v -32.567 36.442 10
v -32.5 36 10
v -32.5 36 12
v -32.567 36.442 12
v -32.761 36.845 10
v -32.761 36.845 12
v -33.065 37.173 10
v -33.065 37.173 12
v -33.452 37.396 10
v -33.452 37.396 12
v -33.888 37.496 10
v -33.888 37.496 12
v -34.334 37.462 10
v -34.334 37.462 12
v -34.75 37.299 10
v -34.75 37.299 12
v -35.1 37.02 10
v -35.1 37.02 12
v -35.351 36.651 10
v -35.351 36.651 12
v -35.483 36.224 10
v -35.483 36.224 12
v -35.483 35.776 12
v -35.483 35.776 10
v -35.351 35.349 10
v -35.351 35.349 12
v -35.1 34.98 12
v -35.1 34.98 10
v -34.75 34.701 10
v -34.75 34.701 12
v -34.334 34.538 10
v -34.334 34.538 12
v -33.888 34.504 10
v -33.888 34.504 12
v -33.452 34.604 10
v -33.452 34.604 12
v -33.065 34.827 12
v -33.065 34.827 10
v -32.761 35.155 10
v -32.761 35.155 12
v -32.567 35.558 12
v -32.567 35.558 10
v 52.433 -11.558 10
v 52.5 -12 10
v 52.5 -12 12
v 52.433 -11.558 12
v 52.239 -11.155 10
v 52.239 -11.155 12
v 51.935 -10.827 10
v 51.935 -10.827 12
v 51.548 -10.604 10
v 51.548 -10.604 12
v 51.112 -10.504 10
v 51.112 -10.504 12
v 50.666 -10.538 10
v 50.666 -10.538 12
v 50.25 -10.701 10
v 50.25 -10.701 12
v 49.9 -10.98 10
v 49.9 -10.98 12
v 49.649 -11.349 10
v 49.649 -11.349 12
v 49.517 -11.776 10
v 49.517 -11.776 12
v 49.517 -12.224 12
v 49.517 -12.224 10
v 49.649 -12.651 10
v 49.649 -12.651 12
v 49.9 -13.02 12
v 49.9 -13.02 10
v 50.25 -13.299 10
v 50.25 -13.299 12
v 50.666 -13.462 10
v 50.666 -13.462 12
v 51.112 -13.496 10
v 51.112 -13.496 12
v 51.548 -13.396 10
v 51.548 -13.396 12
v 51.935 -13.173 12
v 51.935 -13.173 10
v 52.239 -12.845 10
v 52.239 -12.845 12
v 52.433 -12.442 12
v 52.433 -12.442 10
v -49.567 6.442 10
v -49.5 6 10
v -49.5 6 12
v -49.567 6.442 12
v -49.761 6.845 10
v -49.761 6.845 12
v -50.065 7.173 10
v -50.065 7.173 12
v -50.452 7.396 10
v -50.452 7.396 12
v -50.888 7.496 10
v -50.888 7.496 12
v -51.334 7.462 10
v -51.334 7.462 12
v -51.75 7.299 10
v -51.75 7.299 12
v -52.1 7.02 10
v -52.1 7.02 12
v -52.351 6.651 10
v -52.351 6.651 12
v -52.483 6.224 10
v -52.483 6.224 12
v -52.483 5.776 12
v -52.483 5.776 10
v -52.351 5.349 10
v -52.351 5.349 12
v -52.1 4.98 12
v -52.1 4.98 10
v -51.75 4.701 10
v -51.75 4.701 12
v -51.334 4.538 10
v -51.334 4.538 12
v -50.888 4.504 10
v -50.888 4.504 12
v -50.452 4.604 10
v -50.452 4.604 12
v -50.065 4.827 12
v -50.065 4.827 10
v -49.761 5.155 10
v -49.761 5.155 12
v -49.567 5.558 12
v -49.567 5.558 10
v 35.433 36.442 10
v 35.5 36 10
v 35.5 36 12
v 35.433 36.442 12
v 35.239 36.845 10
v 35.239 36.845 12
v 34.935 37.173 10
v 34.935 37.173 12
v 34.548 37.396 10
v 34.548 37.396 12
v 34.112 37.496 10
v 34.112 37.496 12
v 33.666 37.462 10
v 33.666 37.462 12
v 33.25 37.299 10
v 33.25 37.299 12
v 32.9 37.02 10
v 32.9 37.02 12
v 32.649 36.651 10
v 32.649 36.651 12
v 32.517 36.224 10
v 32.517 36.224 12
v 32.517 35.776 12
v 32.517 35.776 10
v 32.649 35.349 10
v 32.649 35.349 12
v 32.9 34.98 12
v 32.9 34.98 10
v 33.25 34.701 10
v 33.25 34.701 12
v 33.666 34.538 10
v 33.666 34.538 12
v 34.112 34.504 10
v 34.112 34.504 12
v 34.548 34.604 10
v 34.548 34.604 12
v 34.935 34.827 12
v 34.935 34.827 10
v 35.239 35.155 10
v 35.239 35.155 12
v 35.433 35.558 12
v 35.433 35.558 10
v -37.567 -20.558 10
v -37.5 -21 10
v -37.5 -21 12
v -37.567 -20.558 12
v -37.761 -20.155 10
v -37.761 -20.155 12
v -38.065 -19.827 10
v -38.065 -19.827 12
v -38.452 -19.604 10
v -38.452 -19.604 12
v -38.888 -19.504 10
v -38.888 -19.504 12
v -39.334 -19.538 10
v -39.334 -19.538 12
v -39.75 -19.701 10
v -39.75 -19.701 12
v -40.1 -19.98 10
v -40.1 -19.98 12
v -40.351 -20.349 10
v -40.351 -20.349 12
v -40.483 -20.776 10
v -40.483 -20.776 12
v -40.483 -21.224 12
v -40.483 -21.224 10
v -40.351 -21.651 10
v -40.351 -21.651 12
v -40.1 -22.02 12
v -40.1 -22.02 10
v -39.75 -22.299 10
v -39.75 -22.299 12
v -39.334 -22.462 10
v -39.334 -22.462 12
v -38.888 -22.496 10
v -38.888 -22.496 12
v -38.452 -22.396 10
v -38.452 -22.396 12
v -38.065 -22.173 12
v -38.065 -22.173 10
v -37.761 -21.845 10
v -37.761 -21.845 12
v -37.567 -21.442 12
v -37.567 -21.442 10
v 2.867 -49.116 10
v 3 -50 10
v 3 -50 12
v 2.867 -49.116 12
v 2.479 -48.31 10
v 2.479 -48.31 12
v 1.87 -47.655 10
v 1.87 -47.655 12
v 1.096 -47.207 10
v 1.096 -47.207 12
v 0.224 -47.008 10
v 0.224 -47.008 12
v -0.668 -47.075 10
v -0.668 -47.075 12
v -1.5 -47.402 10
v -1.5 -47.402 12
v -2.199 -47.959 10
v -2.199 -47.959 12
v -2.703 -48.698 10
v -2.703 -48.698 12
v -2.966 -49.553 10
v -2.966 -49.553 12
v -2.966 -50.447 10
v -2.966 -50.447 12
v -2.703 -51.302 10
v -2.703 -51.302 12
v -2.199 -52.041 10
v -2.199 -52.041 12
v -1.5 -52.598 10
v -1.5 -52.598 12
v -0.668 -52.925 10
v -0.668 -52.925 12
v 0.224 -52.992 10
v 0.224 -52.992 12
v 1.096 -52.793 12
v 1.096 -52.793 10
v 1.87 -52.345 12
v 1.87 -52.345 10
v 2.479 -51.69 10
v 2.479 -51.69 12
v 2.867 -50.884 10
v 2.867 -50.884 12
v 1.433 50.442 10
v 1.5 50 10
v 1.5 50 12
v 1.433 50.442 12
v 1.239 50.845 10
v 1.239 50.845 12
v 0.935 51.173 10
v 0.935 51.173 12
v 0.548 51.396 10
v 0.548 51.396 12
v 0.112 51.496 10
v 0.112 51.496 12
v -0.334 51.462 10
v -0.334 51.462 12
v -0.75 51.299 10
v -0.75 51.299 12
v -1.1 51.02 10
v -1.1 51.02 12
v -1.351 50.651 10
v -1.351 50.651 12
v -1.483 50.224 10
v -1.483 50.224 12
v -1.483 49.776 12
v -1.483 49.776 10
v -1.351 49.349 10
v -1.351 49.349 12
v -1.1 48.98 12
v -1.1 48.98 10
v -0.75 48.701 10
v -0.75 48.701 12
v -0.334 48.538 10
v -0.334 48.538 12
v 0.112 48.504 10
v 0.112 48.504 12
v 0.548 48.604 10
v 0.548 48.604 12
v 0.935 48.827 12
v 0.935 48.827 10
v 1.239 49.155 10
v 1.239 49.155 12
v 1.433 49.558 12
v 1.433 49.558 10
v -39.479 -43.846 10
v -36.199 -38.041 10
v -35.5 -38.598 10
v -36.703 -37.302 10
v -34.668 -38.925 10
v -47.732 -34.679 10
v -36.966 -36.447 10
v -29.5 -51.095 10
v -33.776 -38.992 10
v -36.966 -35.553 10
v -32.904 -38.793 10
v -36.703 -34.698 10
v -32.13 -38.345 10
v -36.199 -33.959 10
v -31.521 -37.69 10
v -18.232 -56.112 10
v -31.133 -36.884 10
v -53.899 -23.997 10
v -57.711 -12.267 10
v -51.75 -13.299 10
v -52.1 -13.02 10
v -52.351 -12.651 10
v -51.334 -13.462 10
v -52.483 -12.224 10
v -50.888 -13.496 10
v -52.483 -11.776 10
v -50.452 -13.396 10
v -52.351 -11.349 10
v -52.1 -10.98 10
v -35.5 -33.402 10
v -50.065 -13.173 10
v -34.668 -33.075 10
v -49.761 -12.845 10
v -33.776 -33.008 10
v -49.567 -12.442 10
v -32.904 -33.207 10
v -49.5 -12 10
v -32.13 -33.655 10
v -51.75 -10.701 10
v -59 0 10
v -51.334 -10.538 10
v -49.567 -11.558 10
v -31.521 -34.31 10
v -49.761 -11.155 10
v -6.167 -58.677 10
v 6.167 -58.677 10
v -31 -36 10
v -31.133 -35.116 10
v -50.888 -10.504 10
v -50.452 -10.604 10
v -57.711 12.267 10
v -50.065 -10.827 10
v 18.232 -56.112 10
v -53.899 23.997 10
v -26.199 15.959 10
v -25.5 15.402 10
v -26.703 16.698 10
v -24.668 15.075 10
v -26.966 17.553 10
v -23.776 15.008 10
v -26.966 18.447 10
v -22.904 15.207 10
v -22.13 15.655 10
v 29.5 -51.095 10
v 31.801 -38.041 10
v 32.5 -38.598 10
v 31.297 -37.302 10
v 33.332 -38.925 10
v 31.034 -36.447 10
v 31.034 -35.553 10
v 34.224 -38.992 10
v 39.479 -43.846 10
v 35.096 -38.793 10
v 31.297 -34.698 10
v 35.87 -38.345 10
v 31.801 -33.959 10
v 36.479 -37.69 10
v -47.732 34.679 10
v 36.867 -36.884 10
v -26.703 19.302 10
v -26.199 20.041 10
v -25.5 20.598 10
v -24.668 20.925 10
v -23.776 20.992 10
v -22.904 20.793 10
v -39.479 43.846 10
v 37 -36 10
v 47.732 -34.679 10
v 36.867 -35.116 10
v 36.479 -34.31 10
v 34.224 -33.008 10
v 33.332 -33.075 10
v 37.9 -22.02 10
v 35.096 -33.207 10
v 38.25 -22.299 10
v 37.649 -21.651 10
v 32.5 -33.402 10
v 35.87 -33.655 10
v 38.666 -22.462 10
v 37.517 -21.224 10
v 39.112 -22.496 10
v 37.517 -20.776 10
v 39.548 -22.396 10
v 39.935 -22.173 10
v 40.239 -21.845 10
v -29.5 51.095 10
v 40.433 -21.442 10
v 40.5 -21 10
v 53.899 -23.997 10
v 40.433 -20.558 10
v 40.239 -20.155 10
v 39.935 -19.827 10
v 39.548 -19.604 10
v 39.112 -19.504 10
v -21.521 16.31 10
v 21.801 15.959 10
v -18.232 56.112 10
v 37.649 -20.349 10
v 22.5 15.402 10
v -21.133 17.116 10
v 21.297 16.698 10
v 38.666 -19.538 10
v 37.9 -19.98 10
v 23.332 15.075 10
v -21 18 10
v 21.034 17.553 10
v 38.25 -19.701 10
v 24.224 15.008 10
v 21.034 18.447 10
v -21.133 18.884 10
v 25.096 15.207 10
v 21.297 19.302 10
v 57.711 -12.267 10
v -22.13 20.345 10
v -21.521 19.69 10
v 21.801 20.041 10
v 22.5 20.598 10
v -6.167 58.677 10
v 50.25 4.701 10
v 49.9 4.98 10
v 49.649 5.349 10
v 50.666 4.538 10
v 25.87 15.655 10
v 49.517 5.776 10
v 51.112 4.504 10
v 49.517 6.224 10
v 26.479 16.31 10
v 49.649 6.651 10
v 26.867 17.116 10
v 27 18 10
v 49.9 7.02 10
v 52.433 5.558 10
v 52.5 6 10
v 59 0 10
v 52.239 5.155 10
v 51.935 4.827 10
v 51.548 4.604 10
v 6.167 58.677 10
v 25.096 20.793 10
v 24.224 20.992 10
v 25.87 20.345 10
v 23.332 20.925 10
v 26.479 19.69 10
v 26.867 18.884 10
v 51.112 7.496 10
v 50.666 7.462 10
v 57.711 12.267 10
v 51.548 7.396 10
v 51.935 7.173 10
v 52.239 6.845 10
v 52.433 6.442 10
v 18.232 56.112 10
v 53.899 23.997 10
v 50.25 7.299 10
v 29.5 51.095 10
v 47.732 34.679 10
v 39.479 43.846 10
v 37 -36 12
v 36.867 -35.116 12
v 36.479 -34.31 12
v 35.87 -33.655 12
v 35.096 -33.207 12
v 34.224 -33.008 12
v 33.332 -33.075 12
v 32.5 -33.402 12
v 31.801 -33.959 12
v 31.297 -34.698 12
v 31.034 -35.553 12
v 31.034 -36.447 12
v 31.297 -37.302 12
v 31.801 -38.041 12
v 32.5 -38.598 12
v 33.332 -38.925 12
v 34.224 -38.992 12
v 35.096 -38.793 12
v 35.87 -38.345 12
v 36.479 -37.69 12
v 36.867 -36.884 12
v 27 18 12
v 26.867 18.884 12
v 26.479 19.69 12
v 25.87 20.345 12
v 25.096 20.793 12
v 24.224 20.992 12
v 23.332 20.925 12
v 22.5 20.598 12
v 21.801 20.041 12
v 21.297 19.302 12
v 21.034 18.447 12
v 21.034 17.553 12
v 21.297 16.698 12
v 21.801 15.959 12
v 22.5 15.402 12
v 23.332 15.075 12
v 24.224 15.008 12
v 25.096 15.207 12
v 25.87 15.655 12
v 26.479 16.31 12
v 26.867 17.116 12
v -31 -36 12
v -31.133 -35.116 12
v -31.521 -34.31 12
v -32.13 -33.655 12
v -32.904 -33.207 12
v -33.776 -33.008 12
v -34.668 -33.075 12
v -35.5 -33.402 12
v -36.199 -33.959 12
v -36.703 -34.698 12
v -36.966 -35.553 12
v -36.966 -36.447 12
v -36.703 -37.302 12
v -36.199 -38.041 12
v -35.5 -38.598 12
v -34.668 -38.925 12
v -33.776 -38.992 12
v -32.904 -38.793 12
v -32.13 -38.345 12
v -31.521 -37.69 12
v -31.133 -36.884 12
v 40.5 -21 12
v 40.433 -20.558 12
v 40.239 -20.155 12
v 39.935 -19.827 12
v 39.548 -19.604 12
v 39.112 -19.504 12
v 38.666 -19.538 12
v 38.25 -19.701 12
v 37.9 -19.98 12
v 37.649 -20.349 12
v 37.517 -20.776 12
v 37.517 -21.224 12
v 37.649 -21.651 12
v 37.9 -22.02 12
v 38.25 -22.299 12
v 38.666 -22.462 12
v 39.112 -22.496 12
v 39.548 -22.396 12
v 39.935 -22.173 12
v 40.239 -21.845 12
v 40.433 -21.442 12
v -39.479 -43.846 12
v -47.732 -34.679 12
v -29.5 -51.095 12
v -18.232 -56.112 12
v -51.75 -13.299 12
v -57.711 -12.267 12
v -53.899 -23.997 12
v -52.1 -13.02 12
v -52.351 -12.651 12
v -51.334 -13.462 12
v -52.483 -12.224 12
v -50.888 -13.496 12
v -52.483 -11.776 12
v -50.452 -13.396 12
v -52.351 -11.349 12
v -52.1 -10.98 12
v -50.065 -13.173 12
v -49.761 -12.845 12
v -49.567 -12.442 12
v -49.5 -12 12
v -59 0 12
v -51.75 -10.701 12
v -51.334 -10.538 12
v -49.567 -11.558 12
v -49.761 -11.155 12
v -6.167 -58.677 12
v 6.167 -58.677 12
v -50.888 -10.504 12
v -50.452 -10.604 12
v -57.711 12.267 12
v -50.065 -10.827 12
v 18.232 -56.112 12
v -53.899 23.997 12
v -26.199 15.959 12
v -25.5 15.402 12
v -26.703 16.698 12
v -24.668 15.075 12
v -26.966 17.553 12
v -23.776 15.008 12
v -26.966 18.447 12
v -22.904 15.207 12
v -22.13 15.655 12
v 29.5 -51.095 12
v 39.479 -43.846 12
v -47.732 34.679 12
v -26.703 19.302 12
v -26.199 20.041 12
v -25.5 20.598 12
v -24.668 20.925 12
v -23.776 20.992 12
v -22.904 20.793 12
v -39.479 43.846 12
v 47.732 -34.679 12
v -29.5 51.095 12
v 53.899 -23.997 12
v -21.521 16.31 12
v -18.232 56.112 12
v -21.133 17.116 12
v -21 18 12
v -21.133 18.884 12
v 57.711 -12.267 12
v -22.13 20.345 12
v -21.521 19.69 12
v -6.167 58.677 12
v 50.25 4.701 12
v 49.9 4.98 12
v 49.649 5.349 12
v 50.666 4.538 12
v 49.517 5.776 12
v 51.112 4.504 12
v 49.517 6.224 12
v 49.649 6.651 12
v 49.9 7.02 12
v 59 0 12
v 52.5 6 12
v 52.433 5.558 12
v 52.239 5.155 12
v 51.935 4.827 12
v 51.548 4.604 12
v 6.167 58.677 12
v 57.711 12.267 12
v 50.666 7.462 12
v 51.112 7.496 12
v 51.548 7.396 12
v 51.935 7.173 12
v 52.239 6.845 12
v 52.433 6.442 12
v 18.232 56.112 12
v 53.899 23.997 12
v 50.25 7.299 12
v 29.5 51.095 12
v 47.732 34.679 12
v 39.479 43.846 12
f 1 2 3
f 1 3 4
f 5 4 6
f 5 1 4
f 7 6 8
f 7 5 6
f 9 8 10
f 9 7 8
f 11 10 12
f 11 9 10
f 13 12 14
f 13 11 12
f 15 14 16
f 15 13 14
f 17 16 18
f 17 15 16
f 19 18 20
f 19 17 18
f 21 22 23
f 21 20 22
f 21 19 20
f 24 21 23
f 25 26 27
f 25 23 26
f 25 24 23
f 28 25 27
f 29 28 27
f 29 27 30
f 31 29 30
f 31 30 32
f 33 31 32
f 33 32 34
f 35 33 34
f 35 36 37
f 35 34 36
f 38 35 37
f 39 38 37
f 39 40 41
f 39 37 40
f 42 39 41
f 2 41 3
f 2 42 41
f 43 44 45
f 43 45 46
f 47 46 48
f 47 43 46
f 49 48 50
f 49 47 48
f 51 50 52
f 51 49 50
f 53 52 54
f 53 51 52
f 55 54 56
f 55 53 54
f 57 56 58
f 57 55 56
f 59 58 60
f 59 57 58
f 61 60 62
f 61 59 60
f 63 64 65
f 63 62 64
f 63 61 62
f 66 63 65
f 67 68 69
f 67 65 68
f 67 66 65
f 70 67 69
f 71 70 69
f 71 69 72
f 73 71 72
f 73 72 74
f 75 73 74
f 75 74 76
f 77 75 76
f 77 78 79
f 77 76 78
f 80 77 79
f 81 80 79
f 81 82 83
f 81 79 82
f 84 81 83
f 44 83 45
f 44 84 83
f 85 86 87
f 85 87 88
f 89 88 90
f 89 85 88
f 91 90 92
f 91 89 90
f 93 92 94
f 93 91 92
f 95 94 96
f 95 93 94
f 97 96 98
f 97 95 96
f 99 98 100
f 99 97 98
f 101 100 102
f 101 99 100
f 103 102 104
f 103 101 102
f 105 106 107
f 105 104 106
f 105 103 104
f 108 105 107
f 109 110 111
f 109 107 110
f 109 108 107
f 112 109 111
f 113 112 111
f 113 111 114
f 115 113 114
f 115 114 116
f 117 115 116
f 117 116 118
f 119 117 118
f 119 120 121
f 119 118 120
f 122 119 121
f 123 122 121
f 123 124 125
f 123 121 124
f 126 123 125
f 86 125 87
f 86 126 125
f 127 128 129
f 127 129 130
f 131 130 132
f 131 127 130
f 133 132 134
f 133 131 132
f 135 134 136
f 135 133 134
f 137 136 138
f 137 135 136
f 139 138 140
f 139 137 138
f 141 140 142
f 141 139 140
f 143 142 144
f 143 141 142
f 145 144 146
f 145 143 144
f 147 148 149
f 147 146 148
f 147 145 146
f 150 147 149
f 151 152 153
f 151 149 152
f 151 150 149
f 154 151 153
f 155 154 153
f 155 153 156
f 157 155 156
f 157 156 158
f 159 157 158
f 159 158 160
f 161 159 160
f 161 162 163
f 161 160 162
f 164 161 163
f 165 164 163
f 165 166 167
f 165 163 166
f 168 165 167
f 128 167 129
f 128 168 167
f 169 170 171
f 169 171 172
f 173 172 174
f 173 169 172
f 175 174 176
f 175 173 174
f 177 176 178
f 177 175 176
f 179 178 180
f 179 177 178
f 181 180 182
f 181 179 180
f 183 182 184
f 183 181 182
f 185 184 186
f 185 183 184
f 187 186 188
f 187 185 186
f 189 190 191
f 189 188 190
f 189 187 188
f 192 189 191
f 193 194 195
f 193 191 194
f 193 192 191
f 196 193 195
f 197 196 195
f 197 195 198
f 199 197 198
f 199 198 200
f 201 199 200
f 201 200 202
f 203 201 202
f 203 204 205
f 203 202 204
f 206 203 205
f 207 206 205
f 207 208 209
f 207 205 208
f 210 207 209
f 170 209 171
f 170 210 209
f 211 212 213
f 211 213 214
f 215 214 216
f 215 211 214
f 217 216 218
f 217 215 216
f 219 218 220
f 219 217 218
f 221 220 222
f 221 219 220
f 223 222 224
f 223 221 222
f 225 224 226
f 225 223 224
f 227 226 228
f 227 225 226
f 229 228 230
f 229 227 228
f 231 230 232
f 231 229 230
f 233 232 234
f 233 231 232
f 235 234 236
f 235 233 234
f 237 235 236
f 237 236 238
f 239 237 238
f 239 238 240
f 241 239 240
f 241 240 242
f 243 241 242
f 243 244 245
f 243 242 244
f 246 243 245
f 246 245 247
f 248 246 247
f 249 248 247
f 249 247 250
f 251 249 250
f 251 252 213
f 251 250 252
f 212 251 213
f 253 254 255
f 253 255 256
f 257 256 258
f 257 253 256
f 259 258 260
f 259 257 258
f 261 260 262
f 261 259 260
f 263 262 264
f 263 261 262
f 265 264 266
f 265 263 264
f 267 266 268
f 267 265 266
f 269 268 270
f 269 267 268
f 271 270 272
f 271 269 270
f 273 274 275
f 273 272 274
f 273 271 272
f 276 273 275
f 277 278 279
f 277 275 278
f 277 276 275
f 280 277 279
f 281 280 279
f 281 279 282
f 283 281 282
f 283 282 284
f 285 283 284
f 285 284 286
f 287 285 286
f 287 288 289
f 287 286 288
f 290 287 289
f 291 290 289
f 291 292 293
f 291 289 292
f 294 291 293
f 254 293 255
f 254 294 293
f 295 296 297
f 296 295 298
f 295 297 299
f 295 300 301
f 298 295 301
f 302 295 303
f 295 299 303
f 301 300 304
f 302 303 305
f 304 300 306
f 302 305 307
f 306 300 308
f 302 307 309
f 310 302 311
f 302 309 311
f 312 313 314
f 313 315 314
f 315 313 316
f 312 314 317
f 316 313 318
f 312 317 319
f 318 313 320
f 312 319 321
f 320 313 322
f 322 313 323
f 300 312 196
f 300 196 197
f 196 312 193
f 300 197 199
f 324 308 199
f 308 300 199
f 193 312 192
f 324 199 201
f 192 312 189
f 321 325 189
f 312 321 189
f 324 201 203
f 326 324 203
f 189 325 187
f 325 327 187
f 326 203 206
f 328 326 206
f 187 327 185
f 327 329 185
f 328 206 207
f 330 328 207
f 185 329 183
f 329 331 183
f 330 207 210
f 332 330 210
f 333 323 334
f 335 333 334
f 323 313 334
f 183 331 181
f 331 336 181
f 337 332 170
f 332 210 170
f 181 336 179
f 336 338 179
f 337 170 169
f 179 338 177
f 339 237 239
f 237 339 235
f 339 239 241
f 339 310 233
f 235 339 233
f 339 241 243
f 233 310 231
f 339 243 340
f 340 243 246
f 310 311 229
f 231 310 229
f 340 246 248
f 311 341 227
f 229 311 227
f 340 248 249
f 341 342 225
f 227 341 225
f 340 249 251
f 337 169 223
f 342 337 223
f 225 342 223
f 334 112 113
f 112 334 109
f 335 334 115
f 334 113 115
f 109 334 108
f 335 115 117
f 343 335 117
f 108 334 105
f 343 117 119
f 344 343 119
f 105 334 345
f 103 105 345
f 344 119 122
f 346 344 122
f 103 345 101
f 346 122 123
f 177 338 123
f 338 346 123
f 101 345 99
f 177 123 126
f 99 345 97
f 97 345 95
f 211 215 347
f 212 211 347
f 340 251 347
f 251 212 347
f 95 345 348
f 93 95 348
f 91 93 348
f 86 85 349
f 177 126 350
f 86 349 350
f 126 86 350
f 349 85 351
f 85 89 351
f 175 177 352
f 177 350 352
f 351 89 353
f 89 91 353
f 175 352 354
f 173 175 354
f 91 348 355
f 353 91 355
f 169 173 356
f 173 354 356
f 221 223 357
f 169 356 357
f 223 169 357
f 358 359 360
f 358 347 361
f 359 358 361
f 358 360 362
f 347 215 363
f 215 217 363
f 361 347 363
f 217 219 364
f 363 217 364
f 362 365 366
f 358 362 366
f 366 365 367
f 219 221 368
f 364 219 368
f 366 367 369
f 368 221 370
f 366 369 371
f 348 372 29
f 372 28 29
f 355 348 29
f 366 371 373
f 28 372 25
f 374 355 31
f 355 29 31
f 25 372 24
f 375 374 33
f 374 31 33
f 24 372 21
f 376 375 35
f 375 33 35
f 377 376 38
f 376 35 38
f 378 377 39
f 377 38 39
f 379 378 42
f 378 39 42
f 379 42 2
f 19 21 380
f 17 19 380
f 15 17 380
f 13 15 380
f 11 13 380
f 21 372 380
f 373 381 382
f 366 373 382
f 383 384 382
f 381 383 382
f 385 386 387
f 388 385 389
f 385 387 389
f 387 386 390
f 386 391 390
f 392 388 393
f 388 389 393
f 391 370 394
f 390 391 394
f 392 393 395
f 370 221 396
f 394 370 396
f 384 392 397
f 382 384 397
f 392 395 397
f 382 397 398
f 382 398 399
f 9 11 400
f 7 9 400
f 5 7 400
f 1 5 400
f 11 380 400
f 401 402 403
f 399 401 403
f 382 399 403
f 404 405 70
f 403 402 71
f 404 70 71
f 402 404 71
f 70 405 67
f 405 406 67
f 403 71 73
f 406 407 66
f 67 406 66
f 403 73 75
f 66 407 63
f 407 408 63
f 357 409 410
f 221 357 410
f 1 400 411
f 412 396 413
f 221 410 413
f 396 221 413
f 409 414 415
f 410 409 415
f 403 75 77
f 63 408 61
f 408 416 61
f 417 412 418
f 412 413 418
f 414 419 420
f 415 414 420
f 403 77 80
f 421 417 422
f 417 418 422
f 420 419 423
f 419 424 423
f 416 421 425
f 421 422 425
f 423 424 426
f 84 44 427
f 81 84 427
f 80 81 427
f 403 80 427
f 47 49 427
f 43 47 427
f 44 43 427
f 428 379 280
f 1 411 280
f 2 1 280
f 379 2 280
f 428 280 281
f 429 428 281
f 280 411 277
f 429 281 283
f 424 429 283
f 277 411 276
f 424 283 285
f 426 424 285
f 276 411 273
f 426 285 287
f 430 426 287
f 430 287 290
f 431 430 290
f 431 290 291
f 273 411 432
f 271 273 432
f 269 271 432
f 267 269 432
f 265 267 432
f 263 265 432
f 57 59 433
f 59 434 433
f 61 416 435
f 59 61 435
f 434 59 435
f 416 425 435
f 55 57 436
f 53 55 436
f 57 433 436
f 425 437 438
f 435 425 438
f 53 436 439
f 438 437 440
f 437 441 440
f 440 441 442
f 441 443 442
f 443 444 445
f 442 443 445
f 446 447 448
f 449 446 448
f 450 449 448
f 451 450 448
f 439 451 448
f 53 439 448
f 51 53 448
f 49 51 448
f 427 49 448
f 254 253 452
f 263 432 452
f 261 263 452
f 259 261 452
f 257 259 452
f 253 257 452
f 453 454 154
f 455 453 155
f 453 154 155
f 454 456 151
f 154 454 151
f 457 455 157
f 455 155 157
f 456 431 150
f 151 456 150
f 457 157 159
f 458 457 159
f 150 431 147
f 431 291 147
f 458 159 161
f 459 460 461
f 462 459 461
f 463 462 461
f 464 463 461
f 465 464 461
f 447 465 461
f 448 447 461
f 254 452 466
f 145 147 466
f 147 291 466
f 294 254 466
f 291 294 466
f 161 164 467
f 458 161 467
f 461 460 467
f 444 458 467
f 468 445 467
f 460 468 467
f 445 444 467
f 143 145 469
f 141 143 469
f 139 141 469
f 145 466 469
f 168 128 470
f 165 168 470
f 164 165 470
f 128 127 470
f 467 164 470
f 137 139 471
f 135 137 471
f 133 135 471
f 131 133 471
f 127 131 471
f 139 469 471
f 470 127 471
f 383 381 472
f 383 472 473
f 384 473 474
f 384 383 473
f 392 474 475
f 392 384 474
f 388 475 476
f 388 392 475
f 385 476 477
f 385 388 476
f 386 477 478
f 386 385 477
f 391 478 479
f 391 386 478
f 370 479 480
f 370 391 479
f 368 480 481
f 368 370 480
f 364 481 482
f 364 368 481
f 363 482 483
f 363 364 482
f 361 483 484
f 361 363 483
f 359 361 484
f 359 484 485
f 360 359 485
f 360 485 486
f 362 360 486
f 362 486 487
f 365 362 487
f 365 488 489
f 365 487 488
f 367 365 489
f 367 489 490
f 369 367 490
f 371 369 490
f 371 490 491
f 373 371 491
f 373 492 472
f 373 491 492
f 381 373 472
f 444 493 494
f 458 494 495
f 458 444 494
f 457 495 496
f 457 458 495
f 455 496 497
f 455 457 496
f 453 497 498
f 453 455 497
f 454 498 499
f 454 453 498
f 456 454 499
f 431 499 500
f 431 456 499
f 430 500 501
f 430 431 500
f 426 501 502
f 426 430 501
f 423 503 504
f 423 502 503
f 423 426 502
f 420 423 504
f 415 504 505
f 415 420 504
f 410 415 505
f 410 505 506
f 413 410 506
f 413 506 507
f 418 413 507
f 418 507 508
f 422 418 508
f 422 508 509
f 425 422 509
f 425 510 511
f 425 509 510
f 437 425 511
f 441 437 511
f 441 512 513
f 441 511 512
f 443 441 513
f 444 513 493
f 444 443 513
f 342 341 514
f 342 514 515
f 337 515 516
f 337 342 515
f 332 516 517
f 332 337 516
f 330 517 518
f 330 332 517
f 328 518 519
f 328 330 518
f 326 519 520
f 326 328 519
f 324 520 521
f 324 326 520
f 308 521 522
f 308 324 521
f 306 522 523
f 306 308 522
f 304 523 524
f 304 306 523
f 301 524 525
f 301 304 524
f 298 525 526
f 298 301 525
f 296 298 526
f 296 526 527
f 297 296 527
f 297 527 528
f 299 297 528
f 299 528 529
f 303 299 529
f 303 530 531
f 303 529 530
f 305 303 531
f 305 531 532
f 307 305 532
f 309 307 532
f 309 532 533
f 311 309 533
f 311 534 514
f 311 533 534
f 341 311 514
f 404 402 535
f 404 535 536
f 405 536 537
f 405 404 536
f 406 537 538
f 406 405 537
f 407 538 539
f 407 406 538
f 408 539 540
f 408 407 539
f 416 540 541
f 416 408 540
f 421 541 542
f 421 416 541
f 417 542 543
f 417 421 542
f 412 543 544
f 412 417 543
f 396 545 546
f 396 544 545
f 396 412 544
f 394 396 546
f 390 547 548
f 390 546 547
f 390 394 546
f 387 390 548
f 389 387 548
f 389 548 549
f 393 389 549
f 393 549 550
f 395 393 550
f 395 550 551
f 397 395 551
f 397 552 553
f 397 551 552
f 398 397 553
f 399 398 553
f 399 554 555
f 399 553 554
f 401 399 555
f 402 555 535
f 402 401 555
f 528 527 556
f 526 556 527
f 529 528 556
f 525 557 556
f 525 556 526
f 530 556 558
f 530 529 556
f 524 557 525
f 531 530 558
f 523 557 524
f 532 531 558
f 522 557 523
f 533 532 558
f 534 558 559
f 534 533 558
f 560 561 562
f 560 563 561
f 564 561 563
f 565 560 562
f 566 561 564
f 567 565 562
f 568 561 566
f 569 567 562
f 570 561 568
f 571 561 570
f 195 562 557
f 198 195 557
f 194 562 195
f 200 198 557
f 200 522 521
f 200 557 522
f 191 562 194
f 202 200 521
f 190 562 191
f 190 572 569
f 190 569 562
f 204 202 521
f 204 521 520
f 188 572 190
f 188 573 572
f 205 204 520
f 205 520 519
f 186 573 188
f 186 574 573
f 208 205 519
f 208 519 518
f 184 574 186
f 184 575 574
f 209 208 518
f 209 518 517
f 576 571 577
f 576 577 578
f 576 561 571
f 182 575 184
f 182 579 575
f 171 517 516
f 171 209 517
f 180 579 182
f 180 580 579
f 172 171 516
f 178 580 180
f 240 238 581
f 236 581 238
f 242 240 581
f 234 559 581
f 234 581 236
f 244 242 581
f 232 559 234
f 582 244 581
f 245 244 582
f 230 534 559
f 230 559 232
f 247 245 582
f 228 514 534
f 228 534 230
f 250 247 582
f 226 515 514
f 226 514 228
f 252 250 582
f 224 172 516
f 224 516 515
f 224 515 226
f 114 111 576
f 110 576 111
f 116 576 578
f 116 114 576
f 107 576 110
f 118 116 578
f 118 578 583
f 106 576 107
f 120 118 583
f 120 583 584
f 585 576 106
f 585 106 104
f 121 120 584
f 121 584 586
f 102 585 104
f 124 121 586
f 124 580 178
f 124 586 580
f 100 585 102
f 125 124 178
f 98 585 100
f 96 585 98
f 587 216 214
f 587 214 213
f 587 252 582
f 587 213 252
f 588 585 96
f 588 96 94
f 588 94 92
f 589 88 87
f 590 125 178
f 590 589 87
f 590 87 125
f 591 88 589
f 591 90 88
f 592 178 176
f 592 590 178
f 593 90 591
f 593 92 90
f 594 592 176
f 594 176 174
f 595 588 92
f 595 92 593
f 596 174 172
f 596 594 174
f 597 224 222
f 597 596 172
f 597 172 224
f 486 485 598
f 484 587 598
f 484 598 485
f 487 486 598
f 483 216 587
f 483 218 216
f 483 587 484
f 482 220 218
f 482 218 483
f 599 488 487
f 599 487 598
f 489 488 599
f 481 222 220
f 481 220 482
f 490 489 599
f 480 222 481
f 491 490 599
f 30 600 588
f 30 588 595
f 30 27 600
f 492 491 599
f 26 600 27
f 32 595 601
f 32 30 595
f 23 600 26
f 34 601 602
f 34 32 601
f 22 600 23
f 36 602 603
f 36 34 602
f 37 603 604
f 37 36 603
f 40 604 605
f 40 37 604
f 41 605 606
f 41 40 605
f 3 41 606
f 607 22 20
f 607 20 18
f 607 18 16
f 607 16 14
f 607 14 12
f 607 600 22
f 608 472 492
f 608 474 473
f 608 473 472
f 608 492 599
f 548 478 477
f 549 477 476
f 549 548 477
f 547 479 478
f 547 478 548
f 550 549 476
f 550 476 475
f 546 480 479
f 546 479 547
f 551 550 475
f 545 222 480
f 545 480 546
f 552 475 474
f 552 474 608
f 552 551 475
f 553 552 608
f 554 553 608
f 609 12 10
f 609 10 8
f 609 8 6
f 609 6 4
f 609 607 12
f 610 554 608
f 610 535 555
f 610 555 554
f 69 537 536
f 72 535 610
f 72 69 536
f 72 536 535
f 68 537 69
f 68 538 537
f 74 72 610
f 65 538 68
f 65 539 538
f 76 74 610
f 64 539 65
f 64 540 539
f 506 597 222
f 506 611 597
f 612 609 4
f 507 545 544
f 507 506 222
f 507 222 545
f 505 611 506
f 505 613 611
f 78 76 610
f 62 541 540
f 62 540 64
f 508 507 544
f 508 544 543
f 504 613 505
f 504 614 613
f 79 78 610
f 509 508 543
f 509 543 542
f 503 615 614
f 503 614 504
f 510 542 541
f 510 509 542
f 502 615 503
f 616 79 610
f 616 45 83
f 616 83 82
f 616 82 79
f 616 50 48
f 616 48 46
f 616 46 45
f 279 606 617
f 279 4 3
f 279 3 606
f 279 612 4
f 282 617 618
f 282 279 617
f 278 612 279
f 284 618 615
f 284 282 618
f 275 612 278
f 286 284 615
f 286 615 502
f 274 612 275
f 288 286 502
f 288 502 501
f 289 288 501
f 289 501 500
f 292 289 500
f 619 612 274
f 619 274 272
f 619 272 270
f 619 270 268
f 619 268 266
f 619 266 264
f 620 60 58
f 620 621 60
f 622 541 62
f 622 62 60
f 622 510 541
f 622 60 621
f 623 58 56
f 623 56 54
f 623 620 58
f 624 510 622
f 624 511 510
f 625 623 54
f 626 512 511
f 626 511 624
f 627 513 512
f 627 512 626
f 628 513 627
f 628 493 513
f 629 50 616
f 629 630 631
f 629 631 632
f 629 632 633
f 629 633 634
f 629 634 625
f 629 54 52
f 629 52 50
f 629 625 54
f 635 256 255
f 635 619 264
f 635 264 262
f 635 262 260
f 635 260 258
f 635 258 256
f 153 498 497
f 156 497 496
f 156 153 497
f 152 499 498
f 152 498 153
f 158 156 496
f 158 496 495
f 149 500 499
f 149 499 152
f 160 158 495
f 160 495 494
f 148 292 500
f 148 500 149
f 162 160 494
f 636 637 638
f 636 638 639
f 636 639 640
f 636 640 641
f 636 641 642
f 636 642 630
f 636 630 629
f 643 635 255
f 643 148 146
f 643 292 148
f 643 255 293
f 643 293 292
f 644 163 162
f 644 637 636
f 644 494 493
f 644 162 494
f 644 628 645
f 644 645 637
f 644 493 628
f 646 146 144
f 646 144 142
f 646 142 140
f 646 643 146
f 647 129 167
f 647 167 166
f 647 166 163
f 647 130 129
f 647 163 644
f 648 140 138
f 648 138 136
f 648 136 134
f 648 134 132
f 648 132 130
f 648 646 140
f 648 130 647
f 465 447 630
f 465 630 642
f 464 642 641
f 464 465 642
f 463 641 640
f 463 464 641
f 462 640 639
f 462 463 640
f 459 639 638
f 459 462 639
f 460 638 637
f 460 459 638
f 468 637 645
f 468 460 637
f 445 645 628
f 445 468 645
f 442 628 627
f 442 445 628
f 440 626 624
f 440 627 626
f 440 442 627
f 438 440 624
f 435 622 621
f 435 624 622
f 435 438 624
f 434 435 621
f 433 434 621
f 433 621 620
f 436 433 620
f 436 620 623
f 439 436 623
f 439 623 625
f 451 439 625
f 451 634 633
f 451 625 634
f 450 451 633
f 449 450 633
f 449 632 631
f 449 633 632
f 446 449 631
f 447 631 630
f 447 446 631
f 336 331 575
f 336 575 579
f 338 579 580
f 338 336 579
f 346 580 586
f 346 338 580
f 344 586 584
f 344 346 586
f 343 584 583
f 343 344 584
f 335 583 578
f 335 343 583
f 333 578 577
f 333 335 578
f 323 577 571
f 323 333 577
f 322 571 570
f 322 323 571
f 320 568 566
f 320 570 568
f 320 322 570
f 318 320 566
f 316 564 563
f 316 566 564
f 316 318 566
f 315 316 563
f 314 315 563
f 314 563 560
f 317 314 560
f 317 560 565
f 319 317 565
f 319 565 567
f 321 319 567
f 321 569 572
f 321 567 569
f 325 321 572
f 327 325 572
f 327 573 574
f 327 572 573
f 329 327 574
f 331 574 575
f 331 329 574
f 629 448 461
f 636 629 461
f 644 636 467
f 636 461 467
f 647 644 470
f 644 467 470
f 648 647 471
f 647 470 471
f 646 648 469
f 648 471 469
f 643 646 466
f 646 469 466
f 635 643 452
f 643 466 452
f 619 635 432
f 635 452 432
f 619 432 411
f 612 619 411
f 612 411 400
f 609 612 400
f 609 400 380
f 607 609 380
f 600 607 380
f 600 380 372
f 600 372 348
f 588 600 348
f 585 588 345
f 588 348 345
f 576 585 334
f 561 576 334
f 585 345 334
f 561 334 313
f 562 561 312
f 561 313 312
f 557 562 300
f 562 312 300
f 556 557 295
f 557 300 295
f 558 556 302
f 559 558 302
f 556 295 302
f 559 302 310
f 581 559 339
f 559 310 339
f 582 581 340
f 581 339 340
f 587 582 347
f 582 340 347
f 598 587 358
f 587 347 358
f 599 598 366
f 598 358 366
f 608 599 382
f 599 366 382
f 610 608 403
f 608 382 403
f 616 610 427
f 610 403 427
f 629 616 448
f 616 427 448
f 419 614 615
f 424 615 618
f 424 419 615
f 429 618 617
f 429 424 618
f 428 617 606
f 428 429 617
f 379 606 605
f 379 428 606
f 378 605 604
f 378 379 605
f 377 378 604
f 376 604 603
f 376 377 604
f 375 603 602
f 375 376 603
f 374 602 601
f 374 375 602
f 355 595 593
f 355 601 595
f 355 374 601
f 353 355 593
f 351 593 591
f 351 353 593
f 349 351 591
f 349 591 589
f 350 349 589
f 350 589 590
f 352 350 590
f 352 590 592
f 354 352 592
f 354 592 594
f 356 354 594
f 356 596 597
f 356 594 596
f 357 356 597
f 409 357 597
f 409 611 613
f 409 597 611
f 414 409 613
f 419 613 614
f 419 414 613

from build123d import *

# Parameters (mm, degrees)
CYLINDER529_R     = 1.5
CYLINDER529_DEPTH = 100
CYLINDER528_R     = 1.5
CYLINDER528_DEPTH = 100
CYLINDER367_R     = 3
CYLINDER367_DEPTH = 4
CYLINDER365_R     = 1.5
CYLINDER365_DEPTH = 50
CYLINDER360_R     = 3
CYLINDER360_DEPTH = 4
CYLINDER359_R     = 3
CYLINDER359_DEPTH = 4
CYLINDER356_R     = 3
CYLINDER356_DEPTH = 4
CYLINDER353_R     = 3
CYLINDER353_DEPTH = 4
CYLINDER350_R     = 1.5
CYLINDER350_DEPTH = 50
CYLINDER349_R     = 1.5
CYLINDER349_DEPTH = 50
CYLINDER347_R     = 1.5
CYLINDER347_DEPTH = 50
CYLINDER348_R     = 1.5
CYLINDER348_DEPTH = 50
CYLINDER346_R     = 1.5
CYLINDER346_DEPTH = 100
CYLINDER345_R     = 1.5
CYLINDER345_DEPTH = 100
CYLINDER287_R     = 59
CYLINDER287_DEPTH = 2


with BuildPart() as v_lec529:
    # Cylinder529 → Cylinder529 (new body)
    with BuildSketch(Plane(origin=(39, -21, 0), x_dir=(1, 0, 0), z_dir=(0, 0, 1))):
        Circle(CYLINDER529_R)
    extrude(amount=CYLINDER529_DEPTH)


with BuildPart() as compound:
    # Cylinder528 → Cylinder528 (new body)
    with BuildSketch(Plane(origin=(-39, -21, 0), x_dir=(1, 0, 0), z_dir=(0, 0, 1))):
        Circle(CYLINDER528_R)
    extrude(amount=CYLINDER528_DEPTH)

    # Compound: union Válec529
    add(v_lec529.part)


with BuildPart() as v_lec367:
    # Cylinder367 → Cylinder367 (new body)
    with BuildSketch(Plane(origin=(0, -50, 9), x_dir=(1, 0, 0), z_dir=(0, 0, 1))):
        Circle(CYLINDER367_R)
    extrude(amount=CYLINDER367_DEPTH)


with BuildPart() as v_lec365:
    # Cylinder365 → Cylinder365 (new body)
    with BuildSketch(Plane(origin=(0, 50, 0), x_dir=(1, 0, 0), z_dir=(0, 0, 1))):
        Circle(CYLINDER365_R)
    extrude(amount=CYLINDER365_DEPTH)


with BuildPart() as v_lec360:
    # Cylinder360 → Cylinder360 (new body)
    with BuildSketch(Plane(origin=(-34, -36, 0), x_dir=(1, 0, 0), z_dir=(0, 0, 1))):
        Circle(CYLINDER360_R)
    extrude(amount=CYLINDER360_DEPTH)


with BuildPart() as compound305:
    # Cylinder359 → Cylinder359 (new body)
    with BuildSketch(Plane(origin=(34, -36, 0), x_dir=(1, 0, 0), z_dir=(0, 0, 1))):
        Circle(CYLINDER359_R)
    extrude(amount=CYLINDER359_DEPTH)

    # Compound305: union Válec360
    add(v_lec360.part)


with BuildPart() as compound305_1:
    # Compound305 placement: moved
    add(compound305.part.moved(Location((0, 0, 9))))


with BuildPart() as v_lec356:
    # Cylinder356 → Cylinder356 (new body)
    with BuildSketch(Plane(origin=(24, 18, 0), x_dir=(1, 0, 0), z_dir=(0, 0, 1))):
        Circle(CYLINDER356_R)
    extrude(amount=CYLINDER356_DEPTH)


with BuildPart() as compound304:
    # Cylinder353 → Cylinder353 (new body)
    with BuildSketch(Plane(origin=(-24, 18, 0), x_dir=(1, 0, 0), z_dir=(0, 0, 1))):
        Circle(CYLINDER353_R)
    extrude(amount=CYLINDER353_DEPTH)

    # Compound304: union Válec356
    add(v_lec356.part)


with BuildPart() as compound304_1:
    # Compound304 placement: moved
    add(compound304.part.moved(Location((0, 0, 10))))


with BuildPart() as v_lec350:
    # Cylinder350 → Cylinder350 (new body)
    with BuildSketch(Plane(origin=(-34, 36, 0), x_dir=(1, 0, 0), z_dir=(0, 0, 1))):
        Circle(CYLINDER350_R)
    extrude(amount=CYLINDER350_DEPTH)


with BuildPart() as v_lec349:
    # Cylinder349 → Cylinder349 (new body)
    with BuildSketch(Plane(origin=(34, 36, 0), x_dir=(1, 0, 0), z_dir=(0, 0, 1))):
        Circle(CYLINDER349_R)
    extrude(amount=CYLINDER349_DEPTH)


with BuildPart() as v_lec347:
    # Cylinder347 → Cylinder347 (new body)
    with BuildSketch(Plane(origin=(51, 6, 0), x_dir=(1, 0, 0), z_dir=(0, 0, 1))):
        Circle(CYLINDER347_R)
    extrude(amount=CYLINDER347_DEPTH)


with BuildPart() as v_lec348:
    # Cylinder348 → Cylinder348 (new body)
    with BuildSketch(Plane(origin=(-51, 6, 0), x_dir=(1, 0, 0), z_dir=(0, 0, 1))):
        Circle(CYLINDER348_R)
    extrude(amount=CYLINDER348_DEPTH)


with BuildPart() as v_lec346:
    # Cylinder346 → Cylinder346 (new body)
    with BuildSketch(Plane(origin=(51, -12, 0), x_dir=(1, 0, 0), z_dir=(0, 0, 1))):
        Circle(CYLINDER346_R)
    extrude(amount=CYLINDER346_DEPTH)


with BuildPart() as compound302:
    # Cylinder345 → Cylinder345 (new body)
    with BuildSketch(Plane(origin=(-51, -12, 0), x_dir=(1, 0, 0), z_dir=(0, 0, 1))):
        Circle(CYLINDER345_R)
    extrude(amount=CYLINDER345_DEPTH)

    # Compound302: union Válec350, Válec349, Válec347, Válec348, Válec346
    add(v_lec350.part)
    add(v_lec349.part)
    add(v_lec347.part)
    add(v_lec348.part)
    add(v_lec346.part)


with BuildPart() as cut160:
    # Cylinder287 → Cylinder287 (new body)
    with BuildSketch(Plane.XY.offset(10)):
        Circle(CYLINDER287_R)
    extrude(amount=CYLINDER287_DEPTH)

    # Cut148: cut Compound302
    add(compound302.part, mode=Mode.SUBTRACT)

    # Cut149: cut Compound304
    add(compound304_1.part, mode=Mode.SUBTRACT)

    # Cut150: cut Compound305
    add(compound305_1.part, mode=Mode.SUBTRACT)

    # Cut155: cut Válec365
    add(v_lec365.part, mode=Mode.SUBTRACT)

    # Cut157: cut Válec367
    add(v_lec367.part, mode=Mode.SUBTRACT)

    # Cut160: cut Compound
    add(compound.part, mode=Mode.SUBTRACT)


solid = cut160.part
